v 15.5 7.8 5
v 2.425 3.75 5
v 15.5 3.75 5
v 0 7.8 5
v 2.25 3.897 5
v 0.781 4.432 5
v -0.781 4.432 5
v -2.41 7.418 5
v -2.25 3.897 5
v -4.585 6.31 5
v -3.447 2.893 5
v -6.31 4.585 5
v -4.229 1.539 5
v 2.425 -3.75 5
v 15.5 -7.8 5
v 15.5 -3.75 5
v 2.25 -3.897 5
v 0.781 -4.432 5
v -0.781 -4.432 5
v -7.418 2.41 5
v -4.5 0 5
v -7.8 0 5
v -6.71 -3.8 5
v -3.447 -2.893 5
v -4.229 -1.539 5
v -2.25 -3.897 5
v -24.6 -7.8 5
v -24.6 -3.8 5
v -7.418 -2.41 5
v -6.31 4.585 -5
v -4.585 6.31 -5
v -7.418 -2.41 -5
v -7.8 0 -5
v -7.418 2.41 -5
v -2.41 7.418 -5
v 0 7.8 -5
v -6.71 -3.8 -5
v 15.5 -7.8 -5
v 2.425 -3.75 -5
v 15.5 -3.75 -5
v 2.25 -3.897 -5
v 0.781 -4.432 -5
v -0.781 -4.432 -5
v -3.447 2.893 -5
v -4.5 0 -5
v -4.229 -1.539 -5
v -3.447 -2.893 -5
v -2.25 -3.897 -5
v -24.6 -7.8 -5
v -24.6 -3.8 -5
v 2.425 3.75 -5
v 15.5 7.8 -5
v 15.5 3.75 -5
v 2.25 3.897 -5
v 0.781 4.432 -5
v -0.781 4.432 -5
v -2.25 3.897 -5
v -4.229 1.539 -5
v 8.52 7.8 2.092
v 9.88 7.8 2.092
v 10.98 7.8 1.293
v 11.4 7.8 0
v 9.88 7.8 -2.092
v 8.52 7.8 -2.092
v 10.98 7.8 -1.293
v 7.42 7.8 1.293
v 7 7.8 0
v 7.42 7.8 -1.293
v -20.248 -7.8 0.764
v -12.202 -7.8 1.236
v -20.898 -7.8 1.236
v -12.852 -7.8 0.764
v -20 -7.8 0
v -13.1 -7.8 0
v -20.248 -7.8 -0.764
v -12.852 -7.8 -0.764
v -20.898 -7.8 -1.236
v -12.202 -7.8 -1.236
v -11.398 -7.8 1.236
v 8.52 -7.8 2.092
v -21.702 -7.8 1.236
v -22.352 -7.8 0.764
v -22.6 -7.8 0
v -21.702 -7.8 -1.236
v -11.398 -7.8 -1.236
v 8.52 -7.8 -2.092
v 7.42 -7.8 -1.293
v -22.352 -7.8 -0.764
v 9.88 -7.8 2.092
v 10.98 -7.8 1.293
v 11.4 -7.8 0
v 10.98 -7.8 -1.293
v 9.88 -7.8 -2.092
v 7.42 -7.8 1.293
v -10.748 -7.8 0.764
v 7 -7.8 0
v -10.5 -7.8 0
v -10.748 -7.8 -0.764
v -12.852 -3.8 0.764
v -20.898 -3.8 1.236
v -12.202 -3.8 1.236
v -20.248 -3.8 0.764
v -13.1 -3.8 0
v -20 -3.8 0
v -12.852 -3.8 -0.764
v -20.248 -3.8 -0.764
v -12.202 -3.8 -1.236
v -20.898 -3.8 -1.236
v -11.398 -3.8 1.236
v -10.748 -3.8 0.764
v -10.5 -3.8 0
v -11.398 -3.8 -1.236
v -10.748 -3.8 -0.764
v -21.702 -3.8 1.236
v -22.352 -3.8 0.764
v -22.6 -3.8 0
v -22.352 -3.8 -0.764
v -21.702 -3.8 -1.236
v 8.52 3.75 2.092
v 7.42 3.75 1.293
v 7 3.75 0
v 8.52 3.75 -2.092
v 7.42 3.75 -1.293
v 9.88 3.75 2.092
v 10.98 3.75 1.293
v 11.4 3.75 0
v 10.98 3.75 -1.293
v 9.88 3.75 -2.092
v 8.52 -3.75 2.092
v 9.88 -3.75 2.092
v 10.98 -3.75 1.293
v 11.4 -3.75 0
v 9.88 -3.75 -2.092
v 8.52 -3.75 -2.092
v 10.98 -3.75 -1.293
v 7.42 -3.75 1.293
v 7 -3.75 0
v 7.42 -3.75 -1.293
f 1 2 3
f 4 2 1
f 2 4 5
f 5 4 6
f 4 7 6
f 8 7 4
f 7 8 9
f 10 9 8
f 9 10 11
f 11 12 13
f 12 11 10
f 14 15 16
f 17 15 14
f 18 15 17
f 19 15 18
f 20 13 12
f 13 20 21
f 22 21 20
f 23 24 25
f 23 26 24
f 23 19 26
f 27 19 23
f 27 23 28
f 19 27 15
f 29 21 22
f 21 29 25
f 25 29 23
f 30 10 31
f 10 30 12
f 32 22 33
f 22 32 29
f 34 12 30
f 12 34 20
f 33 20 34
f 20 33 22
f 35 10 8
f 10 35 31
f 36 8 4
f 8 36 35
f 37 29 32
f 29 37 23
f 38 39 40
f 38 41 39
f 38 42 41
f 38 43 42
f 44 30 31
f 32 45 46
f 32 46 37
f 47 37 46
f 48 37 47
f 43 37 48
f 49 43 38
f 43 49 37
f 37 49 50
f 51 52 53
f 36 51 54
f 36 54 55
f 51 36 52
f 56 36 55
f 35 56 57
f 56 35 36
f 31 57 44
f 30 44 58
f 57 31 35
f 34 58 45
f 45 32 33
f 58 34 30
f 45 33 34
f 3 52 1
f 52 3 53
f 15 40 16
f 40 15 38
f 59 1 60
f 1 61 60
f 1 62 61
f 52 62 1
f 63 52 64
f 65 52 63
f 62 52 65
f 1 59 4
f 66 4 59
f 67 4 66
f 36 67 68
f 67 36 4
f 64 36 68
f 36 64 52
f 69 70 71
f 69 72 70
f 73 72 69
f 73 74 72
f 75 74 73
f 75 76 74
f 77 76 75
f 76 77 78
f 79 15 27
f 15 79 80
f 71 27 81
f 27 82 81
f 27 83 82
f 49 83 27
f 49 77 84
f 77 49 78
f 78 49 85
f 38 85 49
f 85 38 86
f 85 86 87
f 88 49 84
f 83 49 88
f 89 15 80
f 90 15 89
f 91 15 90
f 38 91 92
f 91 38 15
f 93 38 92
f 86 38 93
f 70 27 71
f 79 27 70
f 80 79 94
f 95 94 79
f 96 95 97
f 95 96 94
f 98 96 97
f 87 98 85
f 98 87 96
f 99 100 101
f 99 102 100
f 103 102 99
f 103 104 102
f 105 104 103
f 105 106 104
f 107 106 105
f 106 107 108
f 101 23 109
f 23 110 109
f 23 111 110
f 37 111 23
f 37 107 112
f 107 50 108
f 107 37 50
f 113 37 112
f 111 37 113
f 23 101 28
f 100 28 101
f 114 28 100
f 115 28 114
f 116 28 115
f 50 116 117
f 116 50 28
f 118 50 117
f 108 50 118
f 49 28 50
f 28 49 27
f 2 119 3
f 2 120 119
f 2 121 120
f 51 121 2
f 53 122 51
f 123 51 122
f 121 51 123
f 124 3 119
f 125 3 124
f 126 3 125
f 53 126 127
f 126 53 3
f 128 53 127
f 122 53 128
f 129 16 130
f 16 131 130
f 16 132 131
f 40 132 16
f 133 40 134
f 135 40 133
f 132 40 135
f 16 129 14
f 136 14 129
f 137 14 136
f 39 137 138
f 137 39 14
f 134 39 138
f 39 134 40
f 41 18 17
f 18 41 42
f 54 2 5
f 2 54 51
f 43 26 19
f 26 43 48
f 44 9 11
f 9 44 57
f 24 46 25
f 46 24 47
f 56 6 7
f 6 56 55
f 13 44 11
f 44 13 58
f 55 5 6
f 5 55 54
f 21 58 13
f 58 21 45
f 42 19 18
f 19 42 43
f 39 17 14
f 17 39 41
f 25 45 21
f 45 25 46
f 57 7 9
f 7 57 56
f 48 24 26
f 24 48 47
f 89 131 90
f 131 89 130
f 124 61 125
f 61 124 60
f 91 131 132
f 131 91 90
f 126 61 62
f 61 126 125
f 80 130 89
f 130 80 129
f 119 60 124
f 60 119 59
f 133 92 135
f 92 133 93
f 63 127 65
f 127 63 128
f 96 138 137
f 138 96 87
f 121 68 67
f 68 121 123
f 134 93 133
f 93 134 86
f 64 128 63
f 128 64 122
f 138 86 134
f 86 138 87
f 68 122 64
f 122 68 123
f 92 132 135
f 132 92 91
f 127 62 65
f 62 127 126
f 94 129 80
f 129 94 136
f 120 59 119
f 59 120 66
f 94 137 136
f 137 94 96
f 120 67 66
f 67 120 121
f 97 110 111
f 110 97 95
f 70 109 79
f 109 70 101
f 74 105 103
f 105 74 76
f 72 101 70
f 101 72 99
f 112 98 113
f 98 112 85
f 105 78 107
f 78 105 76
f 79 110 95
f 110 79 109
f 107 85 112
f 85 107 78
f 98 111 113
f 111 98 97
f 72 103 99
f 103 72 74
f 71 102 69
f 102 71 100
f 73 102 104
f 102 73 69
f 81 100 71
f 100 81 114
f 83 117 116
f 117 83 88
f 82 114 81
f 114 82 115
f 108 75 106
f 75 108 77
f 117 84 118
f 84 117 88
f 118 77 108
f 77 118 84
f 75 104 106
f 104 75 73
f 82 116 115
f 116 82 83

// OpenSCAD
// file: configuration.scad
// PRUSA Mendel  
// Configuration file
// GNU GPL v2
// Josef Pra
// josefprusa@me.com
// prusadjs.cz
// http://www.reprap.org/wiki/Prusa_Mendel
// http://github.com/prusajr/PrusaMendel


// PLEASE SELECT ONE OF THE CONFIGURATIONS BELOW
// BY UN-COMMENTING IT


variant=0; //0 for metric
//variant=1; //1 for SAE
if(variant==0){
echo("variant: metric");
}else if(variant==1){
echo("variant: sae");
} else{
echo("WARNING: INVALID CONFIGURATION");
}




vars=[
//[m8_dia, m8_nut, m4_dia, m4_nut, m3_dia, m3_nut, bush_dia, mot_shaft, bush_rod, bush_outerdia, bush_length]
[9,16.4,5,9,4.4,7,11,5.3,8,16,11],//metric
[9,15.7,5.5,10.6,5.5,10.6,11.5,5.3,7.9375,16,11]//SAE
];


//BUSHING TYPE Can generate three versions
// 1 - regular old ones
// 2 - helical ones
// 3 - holders for brass or any other bought bushings
bushing_type = 2;


//Round corner diameter
round_corner_diameter = 8;


//Thin wall size
layer_height = 0.4;
perimeter_width_over_thicknes = 1.6;
infill_widht_over_thickness = 1.55;
thin_wall = 2*(perimeter_width_over_thicknes*layer_height+infill_widht_over_thickness*layer_height);
if(thin_wall<2){
	echo("Check thin wall size, its below 2mm!");
}
echo(thin_wall);


//DO NOT TOUCH THIS SECTION!
m8_diameter = vars[variant][0];
m8_nut_diameter = vars[variant][1];
m4_diameter = vars[variant][2];
m4_nut_diameter = vars[variant][3];
m3_diameter = vars[variant][4];
m3_nut_diameter = vars[variant][5];
bushing_diameter = vars[variant][6];
motor_shaft=vars[variant][7];
bushing_rodsize = vars[variant][8];
bushing_outerDiameter = vars[variant][9];
bushing_lenght = vars[variant][10];




// MINI-HUXLEY VERSION (TODO, just place holder)
// include <configuration-huxley.scad>


// MEGA VERSION (TODO, just place holder)
// include <configuration-mega.scad>




// Some basic functions, probably should be somewhere else
module roundcorner(diameter){
	difference(){
		cube(size = [diameter,diameter,99], center = false);
		translate(v = [diameter, diameter, 0]) cylinder(h = 100, r=diameter, center=true);
	}
}
// main file
// PRUSA Mendel  
// Endstop holder
// Used to attach endstops to 8mm rods
// GNU GPL v2
// Josef Průša
// josefprusa@me.com
// prusadjs.cz
// http://www.reprap.org/wiki/Prusa_Mendel
// http://github.com/prusajr/PrusaMendel

// Modified by Adrian to include support for sub-min microswitches and to make PCB mounts too. 15 May 2011

include <configuration.scad>

/**
 *@name Endstop holder
 *@using 1 m3x20
 *@using 1 m3nut
 *@using 2 m3washer
 */
module endstop(){
outer_diameter = m8_diameter/2+3.3;
screw_hole_spacing = 9.5; // Set to 20 to get standard design
opening_size = m8_diameter-1.5; //openingsize
switch_screw_hole_radius = 1.3; // Set to m3_diameter/2 to get standard design
pcb_mount=false; // Set false for endstop
translate([-outer_diameter, -outer_diameter, -5]) 
difference(){

	union(){


		translate([outer_diameter, outer_diameter, 0]) cylinder(h =10, r = outer_diameter, $fn = 20);
		translate([outer_diameter, 0, 0]) cube([15.5,outer_diameter*2,10]);
		if(!pcb_mount)
			translate([-42,0, 0]) cube([50, 4, 10]);
	}

	// Chop the end just after the hole

	translate([-(56+screw_hole_spacing+ switch_screw_hole_radius), -10, -10]) 
		cube([50, 50, 50]);

	translate([9, outer_diameter-opening_size/2, 0]) cube([18,opening_size,20]);
	translate([outer_diameter, outer_diameter, 0]) cylinder(h =20, r = m8_diameter/2, $fn = 18);
	translate([17, 17, 5]) rotate([90, 0, 0]) cylinder(h =20, r = m3_diameter/2, $fn = 10);
	translate([-4, 17, 5]) rotate([90, 0, 0]) cylinder(h =20, r = switch_screw_hole_radius, $fn = 10);
	translate([-(4+screw_hole_spacing), 17, 5]) rotate([90, 0, 0]) cylinder(h =20, r = switch_screw_hole_radius, $fn = 10);
}
}
endstop();
